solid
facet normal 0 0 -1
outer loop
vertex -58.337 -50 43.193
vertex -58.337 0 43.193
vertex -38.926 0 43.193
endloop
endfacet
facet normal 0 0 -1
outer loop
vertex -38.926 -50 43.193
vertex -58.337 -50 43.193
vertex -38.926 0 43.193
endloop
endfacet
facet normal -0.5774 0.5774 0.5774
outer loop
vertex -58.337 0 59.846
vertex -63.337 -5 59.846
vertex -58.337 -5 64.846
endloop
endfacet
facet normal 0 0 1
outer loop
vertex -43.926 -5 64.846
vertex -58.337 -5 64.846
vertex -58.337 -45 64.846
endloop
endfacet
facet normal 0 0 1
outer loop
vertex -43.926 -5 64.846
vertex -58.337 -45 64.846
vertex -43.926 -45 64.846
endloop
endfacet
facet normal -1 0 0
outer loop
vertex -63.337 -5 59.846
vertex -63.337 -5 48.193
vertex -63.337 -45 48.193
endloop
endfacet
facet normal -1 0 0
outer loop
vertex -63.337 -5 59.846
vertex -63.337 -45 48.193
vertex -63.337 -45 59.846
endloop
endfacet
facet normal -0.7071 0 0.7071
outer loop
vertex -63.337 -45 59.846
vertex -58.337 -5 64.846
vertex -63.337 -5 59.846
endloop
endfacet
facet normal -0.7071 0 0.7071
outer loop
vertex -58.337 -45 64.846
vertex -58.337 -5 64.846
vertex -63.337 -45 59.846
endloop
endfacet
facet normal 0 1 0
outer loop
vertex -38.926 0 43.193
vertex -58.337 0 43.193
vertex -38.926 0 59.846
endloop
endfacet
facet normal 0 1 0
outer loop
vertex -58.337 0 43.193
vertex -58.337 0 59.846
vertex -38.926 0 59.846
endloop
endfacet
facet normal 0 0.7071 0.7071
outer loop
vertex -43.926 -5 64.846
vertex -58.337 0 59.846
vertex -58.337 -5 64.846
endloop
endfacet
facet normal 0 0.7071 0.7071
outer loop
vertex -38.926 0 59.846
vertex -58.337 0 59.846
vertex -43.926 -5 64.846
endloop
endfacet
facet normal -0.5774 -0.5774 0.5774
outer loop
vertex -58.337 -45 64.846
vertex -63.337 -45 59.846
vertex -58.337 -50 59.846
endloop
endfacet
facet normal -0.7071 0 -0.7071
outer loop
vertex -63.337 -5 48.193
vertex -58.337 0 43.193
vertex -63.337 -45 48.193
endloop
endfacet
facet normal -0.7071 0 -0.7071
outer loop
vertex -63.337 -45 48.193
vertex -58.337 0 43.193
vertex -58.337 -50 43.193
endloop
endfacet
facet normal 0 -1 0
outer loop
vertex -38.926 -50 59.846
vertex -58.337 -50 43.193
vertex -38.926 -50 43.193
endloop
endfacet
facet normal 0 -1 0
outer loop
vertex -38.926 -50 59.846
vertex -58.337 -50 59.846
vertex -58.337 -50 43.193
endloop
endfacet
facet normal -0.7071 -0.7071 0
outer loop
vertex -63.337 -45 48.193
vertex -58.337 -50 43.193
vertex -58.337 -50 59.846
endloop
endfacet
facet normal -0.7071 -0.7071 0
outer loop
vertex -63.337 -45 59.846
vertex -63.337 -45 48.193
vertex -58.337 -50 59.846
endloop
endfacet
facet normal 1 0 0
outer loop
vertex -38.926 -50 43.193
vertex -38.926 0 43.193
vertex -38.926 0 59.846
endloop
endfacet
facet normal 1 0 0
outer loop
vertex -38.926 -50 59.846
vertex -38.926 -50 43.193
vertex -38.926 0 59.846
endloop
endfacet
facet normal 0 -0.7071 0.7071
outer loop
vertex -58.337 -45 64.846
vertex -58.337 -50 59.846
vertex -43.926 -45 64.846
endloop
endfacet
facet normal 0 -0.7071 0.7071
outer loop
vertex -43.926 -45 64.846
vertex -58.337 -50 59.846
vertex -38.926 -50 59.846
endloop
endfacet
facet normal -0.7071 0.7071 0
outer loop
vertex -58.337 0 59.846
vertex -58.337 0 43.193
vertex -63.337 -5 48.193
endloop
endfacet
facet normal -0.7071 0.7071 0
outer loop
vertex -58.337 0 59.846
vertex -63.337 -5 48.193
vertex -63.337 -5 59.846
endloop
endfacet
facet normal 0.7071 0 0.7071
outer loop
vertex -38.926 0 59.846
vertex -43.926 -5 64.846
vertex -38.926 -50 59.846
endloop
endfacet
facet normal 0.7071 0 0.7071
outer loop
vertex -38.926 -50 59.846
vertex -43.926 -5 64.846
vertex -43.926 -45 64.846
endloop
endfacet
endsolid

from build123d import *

# Parameters (mm, degrees)
F0_W     = 24.411026
F0_H     = 21.652587
F1_DEPTH = 50
F2_SIZE  = 5


with BuildPart() as f1:
    # F0 (on Front) → F1 (new body)
    with BuildSketch(Plane.XZ):
        with Locations((-51.131187, 54.019387)):
            Rectangle(F0_W, F0_H)
    extrude(amount=F1_DEPTH)

    # F2
    f2_edges = [f1.edges().sort_by_distance(p)[0] for p in [
        (-63.3367, -25, 64.845681),
        (-63.3367, -25, 43.193094),
        (-63.3367, 0, 54.019388),
        (-63.3367, -50, 54.019388),
        (-38.925674, -25, 64.845681),
        (-51.131187, 0, 64.845681),
        (-51.131187, -50, 64.845681),
    ]]
    chamfer(f2_edges, length=F2_SIZE)


solid = f1.part
